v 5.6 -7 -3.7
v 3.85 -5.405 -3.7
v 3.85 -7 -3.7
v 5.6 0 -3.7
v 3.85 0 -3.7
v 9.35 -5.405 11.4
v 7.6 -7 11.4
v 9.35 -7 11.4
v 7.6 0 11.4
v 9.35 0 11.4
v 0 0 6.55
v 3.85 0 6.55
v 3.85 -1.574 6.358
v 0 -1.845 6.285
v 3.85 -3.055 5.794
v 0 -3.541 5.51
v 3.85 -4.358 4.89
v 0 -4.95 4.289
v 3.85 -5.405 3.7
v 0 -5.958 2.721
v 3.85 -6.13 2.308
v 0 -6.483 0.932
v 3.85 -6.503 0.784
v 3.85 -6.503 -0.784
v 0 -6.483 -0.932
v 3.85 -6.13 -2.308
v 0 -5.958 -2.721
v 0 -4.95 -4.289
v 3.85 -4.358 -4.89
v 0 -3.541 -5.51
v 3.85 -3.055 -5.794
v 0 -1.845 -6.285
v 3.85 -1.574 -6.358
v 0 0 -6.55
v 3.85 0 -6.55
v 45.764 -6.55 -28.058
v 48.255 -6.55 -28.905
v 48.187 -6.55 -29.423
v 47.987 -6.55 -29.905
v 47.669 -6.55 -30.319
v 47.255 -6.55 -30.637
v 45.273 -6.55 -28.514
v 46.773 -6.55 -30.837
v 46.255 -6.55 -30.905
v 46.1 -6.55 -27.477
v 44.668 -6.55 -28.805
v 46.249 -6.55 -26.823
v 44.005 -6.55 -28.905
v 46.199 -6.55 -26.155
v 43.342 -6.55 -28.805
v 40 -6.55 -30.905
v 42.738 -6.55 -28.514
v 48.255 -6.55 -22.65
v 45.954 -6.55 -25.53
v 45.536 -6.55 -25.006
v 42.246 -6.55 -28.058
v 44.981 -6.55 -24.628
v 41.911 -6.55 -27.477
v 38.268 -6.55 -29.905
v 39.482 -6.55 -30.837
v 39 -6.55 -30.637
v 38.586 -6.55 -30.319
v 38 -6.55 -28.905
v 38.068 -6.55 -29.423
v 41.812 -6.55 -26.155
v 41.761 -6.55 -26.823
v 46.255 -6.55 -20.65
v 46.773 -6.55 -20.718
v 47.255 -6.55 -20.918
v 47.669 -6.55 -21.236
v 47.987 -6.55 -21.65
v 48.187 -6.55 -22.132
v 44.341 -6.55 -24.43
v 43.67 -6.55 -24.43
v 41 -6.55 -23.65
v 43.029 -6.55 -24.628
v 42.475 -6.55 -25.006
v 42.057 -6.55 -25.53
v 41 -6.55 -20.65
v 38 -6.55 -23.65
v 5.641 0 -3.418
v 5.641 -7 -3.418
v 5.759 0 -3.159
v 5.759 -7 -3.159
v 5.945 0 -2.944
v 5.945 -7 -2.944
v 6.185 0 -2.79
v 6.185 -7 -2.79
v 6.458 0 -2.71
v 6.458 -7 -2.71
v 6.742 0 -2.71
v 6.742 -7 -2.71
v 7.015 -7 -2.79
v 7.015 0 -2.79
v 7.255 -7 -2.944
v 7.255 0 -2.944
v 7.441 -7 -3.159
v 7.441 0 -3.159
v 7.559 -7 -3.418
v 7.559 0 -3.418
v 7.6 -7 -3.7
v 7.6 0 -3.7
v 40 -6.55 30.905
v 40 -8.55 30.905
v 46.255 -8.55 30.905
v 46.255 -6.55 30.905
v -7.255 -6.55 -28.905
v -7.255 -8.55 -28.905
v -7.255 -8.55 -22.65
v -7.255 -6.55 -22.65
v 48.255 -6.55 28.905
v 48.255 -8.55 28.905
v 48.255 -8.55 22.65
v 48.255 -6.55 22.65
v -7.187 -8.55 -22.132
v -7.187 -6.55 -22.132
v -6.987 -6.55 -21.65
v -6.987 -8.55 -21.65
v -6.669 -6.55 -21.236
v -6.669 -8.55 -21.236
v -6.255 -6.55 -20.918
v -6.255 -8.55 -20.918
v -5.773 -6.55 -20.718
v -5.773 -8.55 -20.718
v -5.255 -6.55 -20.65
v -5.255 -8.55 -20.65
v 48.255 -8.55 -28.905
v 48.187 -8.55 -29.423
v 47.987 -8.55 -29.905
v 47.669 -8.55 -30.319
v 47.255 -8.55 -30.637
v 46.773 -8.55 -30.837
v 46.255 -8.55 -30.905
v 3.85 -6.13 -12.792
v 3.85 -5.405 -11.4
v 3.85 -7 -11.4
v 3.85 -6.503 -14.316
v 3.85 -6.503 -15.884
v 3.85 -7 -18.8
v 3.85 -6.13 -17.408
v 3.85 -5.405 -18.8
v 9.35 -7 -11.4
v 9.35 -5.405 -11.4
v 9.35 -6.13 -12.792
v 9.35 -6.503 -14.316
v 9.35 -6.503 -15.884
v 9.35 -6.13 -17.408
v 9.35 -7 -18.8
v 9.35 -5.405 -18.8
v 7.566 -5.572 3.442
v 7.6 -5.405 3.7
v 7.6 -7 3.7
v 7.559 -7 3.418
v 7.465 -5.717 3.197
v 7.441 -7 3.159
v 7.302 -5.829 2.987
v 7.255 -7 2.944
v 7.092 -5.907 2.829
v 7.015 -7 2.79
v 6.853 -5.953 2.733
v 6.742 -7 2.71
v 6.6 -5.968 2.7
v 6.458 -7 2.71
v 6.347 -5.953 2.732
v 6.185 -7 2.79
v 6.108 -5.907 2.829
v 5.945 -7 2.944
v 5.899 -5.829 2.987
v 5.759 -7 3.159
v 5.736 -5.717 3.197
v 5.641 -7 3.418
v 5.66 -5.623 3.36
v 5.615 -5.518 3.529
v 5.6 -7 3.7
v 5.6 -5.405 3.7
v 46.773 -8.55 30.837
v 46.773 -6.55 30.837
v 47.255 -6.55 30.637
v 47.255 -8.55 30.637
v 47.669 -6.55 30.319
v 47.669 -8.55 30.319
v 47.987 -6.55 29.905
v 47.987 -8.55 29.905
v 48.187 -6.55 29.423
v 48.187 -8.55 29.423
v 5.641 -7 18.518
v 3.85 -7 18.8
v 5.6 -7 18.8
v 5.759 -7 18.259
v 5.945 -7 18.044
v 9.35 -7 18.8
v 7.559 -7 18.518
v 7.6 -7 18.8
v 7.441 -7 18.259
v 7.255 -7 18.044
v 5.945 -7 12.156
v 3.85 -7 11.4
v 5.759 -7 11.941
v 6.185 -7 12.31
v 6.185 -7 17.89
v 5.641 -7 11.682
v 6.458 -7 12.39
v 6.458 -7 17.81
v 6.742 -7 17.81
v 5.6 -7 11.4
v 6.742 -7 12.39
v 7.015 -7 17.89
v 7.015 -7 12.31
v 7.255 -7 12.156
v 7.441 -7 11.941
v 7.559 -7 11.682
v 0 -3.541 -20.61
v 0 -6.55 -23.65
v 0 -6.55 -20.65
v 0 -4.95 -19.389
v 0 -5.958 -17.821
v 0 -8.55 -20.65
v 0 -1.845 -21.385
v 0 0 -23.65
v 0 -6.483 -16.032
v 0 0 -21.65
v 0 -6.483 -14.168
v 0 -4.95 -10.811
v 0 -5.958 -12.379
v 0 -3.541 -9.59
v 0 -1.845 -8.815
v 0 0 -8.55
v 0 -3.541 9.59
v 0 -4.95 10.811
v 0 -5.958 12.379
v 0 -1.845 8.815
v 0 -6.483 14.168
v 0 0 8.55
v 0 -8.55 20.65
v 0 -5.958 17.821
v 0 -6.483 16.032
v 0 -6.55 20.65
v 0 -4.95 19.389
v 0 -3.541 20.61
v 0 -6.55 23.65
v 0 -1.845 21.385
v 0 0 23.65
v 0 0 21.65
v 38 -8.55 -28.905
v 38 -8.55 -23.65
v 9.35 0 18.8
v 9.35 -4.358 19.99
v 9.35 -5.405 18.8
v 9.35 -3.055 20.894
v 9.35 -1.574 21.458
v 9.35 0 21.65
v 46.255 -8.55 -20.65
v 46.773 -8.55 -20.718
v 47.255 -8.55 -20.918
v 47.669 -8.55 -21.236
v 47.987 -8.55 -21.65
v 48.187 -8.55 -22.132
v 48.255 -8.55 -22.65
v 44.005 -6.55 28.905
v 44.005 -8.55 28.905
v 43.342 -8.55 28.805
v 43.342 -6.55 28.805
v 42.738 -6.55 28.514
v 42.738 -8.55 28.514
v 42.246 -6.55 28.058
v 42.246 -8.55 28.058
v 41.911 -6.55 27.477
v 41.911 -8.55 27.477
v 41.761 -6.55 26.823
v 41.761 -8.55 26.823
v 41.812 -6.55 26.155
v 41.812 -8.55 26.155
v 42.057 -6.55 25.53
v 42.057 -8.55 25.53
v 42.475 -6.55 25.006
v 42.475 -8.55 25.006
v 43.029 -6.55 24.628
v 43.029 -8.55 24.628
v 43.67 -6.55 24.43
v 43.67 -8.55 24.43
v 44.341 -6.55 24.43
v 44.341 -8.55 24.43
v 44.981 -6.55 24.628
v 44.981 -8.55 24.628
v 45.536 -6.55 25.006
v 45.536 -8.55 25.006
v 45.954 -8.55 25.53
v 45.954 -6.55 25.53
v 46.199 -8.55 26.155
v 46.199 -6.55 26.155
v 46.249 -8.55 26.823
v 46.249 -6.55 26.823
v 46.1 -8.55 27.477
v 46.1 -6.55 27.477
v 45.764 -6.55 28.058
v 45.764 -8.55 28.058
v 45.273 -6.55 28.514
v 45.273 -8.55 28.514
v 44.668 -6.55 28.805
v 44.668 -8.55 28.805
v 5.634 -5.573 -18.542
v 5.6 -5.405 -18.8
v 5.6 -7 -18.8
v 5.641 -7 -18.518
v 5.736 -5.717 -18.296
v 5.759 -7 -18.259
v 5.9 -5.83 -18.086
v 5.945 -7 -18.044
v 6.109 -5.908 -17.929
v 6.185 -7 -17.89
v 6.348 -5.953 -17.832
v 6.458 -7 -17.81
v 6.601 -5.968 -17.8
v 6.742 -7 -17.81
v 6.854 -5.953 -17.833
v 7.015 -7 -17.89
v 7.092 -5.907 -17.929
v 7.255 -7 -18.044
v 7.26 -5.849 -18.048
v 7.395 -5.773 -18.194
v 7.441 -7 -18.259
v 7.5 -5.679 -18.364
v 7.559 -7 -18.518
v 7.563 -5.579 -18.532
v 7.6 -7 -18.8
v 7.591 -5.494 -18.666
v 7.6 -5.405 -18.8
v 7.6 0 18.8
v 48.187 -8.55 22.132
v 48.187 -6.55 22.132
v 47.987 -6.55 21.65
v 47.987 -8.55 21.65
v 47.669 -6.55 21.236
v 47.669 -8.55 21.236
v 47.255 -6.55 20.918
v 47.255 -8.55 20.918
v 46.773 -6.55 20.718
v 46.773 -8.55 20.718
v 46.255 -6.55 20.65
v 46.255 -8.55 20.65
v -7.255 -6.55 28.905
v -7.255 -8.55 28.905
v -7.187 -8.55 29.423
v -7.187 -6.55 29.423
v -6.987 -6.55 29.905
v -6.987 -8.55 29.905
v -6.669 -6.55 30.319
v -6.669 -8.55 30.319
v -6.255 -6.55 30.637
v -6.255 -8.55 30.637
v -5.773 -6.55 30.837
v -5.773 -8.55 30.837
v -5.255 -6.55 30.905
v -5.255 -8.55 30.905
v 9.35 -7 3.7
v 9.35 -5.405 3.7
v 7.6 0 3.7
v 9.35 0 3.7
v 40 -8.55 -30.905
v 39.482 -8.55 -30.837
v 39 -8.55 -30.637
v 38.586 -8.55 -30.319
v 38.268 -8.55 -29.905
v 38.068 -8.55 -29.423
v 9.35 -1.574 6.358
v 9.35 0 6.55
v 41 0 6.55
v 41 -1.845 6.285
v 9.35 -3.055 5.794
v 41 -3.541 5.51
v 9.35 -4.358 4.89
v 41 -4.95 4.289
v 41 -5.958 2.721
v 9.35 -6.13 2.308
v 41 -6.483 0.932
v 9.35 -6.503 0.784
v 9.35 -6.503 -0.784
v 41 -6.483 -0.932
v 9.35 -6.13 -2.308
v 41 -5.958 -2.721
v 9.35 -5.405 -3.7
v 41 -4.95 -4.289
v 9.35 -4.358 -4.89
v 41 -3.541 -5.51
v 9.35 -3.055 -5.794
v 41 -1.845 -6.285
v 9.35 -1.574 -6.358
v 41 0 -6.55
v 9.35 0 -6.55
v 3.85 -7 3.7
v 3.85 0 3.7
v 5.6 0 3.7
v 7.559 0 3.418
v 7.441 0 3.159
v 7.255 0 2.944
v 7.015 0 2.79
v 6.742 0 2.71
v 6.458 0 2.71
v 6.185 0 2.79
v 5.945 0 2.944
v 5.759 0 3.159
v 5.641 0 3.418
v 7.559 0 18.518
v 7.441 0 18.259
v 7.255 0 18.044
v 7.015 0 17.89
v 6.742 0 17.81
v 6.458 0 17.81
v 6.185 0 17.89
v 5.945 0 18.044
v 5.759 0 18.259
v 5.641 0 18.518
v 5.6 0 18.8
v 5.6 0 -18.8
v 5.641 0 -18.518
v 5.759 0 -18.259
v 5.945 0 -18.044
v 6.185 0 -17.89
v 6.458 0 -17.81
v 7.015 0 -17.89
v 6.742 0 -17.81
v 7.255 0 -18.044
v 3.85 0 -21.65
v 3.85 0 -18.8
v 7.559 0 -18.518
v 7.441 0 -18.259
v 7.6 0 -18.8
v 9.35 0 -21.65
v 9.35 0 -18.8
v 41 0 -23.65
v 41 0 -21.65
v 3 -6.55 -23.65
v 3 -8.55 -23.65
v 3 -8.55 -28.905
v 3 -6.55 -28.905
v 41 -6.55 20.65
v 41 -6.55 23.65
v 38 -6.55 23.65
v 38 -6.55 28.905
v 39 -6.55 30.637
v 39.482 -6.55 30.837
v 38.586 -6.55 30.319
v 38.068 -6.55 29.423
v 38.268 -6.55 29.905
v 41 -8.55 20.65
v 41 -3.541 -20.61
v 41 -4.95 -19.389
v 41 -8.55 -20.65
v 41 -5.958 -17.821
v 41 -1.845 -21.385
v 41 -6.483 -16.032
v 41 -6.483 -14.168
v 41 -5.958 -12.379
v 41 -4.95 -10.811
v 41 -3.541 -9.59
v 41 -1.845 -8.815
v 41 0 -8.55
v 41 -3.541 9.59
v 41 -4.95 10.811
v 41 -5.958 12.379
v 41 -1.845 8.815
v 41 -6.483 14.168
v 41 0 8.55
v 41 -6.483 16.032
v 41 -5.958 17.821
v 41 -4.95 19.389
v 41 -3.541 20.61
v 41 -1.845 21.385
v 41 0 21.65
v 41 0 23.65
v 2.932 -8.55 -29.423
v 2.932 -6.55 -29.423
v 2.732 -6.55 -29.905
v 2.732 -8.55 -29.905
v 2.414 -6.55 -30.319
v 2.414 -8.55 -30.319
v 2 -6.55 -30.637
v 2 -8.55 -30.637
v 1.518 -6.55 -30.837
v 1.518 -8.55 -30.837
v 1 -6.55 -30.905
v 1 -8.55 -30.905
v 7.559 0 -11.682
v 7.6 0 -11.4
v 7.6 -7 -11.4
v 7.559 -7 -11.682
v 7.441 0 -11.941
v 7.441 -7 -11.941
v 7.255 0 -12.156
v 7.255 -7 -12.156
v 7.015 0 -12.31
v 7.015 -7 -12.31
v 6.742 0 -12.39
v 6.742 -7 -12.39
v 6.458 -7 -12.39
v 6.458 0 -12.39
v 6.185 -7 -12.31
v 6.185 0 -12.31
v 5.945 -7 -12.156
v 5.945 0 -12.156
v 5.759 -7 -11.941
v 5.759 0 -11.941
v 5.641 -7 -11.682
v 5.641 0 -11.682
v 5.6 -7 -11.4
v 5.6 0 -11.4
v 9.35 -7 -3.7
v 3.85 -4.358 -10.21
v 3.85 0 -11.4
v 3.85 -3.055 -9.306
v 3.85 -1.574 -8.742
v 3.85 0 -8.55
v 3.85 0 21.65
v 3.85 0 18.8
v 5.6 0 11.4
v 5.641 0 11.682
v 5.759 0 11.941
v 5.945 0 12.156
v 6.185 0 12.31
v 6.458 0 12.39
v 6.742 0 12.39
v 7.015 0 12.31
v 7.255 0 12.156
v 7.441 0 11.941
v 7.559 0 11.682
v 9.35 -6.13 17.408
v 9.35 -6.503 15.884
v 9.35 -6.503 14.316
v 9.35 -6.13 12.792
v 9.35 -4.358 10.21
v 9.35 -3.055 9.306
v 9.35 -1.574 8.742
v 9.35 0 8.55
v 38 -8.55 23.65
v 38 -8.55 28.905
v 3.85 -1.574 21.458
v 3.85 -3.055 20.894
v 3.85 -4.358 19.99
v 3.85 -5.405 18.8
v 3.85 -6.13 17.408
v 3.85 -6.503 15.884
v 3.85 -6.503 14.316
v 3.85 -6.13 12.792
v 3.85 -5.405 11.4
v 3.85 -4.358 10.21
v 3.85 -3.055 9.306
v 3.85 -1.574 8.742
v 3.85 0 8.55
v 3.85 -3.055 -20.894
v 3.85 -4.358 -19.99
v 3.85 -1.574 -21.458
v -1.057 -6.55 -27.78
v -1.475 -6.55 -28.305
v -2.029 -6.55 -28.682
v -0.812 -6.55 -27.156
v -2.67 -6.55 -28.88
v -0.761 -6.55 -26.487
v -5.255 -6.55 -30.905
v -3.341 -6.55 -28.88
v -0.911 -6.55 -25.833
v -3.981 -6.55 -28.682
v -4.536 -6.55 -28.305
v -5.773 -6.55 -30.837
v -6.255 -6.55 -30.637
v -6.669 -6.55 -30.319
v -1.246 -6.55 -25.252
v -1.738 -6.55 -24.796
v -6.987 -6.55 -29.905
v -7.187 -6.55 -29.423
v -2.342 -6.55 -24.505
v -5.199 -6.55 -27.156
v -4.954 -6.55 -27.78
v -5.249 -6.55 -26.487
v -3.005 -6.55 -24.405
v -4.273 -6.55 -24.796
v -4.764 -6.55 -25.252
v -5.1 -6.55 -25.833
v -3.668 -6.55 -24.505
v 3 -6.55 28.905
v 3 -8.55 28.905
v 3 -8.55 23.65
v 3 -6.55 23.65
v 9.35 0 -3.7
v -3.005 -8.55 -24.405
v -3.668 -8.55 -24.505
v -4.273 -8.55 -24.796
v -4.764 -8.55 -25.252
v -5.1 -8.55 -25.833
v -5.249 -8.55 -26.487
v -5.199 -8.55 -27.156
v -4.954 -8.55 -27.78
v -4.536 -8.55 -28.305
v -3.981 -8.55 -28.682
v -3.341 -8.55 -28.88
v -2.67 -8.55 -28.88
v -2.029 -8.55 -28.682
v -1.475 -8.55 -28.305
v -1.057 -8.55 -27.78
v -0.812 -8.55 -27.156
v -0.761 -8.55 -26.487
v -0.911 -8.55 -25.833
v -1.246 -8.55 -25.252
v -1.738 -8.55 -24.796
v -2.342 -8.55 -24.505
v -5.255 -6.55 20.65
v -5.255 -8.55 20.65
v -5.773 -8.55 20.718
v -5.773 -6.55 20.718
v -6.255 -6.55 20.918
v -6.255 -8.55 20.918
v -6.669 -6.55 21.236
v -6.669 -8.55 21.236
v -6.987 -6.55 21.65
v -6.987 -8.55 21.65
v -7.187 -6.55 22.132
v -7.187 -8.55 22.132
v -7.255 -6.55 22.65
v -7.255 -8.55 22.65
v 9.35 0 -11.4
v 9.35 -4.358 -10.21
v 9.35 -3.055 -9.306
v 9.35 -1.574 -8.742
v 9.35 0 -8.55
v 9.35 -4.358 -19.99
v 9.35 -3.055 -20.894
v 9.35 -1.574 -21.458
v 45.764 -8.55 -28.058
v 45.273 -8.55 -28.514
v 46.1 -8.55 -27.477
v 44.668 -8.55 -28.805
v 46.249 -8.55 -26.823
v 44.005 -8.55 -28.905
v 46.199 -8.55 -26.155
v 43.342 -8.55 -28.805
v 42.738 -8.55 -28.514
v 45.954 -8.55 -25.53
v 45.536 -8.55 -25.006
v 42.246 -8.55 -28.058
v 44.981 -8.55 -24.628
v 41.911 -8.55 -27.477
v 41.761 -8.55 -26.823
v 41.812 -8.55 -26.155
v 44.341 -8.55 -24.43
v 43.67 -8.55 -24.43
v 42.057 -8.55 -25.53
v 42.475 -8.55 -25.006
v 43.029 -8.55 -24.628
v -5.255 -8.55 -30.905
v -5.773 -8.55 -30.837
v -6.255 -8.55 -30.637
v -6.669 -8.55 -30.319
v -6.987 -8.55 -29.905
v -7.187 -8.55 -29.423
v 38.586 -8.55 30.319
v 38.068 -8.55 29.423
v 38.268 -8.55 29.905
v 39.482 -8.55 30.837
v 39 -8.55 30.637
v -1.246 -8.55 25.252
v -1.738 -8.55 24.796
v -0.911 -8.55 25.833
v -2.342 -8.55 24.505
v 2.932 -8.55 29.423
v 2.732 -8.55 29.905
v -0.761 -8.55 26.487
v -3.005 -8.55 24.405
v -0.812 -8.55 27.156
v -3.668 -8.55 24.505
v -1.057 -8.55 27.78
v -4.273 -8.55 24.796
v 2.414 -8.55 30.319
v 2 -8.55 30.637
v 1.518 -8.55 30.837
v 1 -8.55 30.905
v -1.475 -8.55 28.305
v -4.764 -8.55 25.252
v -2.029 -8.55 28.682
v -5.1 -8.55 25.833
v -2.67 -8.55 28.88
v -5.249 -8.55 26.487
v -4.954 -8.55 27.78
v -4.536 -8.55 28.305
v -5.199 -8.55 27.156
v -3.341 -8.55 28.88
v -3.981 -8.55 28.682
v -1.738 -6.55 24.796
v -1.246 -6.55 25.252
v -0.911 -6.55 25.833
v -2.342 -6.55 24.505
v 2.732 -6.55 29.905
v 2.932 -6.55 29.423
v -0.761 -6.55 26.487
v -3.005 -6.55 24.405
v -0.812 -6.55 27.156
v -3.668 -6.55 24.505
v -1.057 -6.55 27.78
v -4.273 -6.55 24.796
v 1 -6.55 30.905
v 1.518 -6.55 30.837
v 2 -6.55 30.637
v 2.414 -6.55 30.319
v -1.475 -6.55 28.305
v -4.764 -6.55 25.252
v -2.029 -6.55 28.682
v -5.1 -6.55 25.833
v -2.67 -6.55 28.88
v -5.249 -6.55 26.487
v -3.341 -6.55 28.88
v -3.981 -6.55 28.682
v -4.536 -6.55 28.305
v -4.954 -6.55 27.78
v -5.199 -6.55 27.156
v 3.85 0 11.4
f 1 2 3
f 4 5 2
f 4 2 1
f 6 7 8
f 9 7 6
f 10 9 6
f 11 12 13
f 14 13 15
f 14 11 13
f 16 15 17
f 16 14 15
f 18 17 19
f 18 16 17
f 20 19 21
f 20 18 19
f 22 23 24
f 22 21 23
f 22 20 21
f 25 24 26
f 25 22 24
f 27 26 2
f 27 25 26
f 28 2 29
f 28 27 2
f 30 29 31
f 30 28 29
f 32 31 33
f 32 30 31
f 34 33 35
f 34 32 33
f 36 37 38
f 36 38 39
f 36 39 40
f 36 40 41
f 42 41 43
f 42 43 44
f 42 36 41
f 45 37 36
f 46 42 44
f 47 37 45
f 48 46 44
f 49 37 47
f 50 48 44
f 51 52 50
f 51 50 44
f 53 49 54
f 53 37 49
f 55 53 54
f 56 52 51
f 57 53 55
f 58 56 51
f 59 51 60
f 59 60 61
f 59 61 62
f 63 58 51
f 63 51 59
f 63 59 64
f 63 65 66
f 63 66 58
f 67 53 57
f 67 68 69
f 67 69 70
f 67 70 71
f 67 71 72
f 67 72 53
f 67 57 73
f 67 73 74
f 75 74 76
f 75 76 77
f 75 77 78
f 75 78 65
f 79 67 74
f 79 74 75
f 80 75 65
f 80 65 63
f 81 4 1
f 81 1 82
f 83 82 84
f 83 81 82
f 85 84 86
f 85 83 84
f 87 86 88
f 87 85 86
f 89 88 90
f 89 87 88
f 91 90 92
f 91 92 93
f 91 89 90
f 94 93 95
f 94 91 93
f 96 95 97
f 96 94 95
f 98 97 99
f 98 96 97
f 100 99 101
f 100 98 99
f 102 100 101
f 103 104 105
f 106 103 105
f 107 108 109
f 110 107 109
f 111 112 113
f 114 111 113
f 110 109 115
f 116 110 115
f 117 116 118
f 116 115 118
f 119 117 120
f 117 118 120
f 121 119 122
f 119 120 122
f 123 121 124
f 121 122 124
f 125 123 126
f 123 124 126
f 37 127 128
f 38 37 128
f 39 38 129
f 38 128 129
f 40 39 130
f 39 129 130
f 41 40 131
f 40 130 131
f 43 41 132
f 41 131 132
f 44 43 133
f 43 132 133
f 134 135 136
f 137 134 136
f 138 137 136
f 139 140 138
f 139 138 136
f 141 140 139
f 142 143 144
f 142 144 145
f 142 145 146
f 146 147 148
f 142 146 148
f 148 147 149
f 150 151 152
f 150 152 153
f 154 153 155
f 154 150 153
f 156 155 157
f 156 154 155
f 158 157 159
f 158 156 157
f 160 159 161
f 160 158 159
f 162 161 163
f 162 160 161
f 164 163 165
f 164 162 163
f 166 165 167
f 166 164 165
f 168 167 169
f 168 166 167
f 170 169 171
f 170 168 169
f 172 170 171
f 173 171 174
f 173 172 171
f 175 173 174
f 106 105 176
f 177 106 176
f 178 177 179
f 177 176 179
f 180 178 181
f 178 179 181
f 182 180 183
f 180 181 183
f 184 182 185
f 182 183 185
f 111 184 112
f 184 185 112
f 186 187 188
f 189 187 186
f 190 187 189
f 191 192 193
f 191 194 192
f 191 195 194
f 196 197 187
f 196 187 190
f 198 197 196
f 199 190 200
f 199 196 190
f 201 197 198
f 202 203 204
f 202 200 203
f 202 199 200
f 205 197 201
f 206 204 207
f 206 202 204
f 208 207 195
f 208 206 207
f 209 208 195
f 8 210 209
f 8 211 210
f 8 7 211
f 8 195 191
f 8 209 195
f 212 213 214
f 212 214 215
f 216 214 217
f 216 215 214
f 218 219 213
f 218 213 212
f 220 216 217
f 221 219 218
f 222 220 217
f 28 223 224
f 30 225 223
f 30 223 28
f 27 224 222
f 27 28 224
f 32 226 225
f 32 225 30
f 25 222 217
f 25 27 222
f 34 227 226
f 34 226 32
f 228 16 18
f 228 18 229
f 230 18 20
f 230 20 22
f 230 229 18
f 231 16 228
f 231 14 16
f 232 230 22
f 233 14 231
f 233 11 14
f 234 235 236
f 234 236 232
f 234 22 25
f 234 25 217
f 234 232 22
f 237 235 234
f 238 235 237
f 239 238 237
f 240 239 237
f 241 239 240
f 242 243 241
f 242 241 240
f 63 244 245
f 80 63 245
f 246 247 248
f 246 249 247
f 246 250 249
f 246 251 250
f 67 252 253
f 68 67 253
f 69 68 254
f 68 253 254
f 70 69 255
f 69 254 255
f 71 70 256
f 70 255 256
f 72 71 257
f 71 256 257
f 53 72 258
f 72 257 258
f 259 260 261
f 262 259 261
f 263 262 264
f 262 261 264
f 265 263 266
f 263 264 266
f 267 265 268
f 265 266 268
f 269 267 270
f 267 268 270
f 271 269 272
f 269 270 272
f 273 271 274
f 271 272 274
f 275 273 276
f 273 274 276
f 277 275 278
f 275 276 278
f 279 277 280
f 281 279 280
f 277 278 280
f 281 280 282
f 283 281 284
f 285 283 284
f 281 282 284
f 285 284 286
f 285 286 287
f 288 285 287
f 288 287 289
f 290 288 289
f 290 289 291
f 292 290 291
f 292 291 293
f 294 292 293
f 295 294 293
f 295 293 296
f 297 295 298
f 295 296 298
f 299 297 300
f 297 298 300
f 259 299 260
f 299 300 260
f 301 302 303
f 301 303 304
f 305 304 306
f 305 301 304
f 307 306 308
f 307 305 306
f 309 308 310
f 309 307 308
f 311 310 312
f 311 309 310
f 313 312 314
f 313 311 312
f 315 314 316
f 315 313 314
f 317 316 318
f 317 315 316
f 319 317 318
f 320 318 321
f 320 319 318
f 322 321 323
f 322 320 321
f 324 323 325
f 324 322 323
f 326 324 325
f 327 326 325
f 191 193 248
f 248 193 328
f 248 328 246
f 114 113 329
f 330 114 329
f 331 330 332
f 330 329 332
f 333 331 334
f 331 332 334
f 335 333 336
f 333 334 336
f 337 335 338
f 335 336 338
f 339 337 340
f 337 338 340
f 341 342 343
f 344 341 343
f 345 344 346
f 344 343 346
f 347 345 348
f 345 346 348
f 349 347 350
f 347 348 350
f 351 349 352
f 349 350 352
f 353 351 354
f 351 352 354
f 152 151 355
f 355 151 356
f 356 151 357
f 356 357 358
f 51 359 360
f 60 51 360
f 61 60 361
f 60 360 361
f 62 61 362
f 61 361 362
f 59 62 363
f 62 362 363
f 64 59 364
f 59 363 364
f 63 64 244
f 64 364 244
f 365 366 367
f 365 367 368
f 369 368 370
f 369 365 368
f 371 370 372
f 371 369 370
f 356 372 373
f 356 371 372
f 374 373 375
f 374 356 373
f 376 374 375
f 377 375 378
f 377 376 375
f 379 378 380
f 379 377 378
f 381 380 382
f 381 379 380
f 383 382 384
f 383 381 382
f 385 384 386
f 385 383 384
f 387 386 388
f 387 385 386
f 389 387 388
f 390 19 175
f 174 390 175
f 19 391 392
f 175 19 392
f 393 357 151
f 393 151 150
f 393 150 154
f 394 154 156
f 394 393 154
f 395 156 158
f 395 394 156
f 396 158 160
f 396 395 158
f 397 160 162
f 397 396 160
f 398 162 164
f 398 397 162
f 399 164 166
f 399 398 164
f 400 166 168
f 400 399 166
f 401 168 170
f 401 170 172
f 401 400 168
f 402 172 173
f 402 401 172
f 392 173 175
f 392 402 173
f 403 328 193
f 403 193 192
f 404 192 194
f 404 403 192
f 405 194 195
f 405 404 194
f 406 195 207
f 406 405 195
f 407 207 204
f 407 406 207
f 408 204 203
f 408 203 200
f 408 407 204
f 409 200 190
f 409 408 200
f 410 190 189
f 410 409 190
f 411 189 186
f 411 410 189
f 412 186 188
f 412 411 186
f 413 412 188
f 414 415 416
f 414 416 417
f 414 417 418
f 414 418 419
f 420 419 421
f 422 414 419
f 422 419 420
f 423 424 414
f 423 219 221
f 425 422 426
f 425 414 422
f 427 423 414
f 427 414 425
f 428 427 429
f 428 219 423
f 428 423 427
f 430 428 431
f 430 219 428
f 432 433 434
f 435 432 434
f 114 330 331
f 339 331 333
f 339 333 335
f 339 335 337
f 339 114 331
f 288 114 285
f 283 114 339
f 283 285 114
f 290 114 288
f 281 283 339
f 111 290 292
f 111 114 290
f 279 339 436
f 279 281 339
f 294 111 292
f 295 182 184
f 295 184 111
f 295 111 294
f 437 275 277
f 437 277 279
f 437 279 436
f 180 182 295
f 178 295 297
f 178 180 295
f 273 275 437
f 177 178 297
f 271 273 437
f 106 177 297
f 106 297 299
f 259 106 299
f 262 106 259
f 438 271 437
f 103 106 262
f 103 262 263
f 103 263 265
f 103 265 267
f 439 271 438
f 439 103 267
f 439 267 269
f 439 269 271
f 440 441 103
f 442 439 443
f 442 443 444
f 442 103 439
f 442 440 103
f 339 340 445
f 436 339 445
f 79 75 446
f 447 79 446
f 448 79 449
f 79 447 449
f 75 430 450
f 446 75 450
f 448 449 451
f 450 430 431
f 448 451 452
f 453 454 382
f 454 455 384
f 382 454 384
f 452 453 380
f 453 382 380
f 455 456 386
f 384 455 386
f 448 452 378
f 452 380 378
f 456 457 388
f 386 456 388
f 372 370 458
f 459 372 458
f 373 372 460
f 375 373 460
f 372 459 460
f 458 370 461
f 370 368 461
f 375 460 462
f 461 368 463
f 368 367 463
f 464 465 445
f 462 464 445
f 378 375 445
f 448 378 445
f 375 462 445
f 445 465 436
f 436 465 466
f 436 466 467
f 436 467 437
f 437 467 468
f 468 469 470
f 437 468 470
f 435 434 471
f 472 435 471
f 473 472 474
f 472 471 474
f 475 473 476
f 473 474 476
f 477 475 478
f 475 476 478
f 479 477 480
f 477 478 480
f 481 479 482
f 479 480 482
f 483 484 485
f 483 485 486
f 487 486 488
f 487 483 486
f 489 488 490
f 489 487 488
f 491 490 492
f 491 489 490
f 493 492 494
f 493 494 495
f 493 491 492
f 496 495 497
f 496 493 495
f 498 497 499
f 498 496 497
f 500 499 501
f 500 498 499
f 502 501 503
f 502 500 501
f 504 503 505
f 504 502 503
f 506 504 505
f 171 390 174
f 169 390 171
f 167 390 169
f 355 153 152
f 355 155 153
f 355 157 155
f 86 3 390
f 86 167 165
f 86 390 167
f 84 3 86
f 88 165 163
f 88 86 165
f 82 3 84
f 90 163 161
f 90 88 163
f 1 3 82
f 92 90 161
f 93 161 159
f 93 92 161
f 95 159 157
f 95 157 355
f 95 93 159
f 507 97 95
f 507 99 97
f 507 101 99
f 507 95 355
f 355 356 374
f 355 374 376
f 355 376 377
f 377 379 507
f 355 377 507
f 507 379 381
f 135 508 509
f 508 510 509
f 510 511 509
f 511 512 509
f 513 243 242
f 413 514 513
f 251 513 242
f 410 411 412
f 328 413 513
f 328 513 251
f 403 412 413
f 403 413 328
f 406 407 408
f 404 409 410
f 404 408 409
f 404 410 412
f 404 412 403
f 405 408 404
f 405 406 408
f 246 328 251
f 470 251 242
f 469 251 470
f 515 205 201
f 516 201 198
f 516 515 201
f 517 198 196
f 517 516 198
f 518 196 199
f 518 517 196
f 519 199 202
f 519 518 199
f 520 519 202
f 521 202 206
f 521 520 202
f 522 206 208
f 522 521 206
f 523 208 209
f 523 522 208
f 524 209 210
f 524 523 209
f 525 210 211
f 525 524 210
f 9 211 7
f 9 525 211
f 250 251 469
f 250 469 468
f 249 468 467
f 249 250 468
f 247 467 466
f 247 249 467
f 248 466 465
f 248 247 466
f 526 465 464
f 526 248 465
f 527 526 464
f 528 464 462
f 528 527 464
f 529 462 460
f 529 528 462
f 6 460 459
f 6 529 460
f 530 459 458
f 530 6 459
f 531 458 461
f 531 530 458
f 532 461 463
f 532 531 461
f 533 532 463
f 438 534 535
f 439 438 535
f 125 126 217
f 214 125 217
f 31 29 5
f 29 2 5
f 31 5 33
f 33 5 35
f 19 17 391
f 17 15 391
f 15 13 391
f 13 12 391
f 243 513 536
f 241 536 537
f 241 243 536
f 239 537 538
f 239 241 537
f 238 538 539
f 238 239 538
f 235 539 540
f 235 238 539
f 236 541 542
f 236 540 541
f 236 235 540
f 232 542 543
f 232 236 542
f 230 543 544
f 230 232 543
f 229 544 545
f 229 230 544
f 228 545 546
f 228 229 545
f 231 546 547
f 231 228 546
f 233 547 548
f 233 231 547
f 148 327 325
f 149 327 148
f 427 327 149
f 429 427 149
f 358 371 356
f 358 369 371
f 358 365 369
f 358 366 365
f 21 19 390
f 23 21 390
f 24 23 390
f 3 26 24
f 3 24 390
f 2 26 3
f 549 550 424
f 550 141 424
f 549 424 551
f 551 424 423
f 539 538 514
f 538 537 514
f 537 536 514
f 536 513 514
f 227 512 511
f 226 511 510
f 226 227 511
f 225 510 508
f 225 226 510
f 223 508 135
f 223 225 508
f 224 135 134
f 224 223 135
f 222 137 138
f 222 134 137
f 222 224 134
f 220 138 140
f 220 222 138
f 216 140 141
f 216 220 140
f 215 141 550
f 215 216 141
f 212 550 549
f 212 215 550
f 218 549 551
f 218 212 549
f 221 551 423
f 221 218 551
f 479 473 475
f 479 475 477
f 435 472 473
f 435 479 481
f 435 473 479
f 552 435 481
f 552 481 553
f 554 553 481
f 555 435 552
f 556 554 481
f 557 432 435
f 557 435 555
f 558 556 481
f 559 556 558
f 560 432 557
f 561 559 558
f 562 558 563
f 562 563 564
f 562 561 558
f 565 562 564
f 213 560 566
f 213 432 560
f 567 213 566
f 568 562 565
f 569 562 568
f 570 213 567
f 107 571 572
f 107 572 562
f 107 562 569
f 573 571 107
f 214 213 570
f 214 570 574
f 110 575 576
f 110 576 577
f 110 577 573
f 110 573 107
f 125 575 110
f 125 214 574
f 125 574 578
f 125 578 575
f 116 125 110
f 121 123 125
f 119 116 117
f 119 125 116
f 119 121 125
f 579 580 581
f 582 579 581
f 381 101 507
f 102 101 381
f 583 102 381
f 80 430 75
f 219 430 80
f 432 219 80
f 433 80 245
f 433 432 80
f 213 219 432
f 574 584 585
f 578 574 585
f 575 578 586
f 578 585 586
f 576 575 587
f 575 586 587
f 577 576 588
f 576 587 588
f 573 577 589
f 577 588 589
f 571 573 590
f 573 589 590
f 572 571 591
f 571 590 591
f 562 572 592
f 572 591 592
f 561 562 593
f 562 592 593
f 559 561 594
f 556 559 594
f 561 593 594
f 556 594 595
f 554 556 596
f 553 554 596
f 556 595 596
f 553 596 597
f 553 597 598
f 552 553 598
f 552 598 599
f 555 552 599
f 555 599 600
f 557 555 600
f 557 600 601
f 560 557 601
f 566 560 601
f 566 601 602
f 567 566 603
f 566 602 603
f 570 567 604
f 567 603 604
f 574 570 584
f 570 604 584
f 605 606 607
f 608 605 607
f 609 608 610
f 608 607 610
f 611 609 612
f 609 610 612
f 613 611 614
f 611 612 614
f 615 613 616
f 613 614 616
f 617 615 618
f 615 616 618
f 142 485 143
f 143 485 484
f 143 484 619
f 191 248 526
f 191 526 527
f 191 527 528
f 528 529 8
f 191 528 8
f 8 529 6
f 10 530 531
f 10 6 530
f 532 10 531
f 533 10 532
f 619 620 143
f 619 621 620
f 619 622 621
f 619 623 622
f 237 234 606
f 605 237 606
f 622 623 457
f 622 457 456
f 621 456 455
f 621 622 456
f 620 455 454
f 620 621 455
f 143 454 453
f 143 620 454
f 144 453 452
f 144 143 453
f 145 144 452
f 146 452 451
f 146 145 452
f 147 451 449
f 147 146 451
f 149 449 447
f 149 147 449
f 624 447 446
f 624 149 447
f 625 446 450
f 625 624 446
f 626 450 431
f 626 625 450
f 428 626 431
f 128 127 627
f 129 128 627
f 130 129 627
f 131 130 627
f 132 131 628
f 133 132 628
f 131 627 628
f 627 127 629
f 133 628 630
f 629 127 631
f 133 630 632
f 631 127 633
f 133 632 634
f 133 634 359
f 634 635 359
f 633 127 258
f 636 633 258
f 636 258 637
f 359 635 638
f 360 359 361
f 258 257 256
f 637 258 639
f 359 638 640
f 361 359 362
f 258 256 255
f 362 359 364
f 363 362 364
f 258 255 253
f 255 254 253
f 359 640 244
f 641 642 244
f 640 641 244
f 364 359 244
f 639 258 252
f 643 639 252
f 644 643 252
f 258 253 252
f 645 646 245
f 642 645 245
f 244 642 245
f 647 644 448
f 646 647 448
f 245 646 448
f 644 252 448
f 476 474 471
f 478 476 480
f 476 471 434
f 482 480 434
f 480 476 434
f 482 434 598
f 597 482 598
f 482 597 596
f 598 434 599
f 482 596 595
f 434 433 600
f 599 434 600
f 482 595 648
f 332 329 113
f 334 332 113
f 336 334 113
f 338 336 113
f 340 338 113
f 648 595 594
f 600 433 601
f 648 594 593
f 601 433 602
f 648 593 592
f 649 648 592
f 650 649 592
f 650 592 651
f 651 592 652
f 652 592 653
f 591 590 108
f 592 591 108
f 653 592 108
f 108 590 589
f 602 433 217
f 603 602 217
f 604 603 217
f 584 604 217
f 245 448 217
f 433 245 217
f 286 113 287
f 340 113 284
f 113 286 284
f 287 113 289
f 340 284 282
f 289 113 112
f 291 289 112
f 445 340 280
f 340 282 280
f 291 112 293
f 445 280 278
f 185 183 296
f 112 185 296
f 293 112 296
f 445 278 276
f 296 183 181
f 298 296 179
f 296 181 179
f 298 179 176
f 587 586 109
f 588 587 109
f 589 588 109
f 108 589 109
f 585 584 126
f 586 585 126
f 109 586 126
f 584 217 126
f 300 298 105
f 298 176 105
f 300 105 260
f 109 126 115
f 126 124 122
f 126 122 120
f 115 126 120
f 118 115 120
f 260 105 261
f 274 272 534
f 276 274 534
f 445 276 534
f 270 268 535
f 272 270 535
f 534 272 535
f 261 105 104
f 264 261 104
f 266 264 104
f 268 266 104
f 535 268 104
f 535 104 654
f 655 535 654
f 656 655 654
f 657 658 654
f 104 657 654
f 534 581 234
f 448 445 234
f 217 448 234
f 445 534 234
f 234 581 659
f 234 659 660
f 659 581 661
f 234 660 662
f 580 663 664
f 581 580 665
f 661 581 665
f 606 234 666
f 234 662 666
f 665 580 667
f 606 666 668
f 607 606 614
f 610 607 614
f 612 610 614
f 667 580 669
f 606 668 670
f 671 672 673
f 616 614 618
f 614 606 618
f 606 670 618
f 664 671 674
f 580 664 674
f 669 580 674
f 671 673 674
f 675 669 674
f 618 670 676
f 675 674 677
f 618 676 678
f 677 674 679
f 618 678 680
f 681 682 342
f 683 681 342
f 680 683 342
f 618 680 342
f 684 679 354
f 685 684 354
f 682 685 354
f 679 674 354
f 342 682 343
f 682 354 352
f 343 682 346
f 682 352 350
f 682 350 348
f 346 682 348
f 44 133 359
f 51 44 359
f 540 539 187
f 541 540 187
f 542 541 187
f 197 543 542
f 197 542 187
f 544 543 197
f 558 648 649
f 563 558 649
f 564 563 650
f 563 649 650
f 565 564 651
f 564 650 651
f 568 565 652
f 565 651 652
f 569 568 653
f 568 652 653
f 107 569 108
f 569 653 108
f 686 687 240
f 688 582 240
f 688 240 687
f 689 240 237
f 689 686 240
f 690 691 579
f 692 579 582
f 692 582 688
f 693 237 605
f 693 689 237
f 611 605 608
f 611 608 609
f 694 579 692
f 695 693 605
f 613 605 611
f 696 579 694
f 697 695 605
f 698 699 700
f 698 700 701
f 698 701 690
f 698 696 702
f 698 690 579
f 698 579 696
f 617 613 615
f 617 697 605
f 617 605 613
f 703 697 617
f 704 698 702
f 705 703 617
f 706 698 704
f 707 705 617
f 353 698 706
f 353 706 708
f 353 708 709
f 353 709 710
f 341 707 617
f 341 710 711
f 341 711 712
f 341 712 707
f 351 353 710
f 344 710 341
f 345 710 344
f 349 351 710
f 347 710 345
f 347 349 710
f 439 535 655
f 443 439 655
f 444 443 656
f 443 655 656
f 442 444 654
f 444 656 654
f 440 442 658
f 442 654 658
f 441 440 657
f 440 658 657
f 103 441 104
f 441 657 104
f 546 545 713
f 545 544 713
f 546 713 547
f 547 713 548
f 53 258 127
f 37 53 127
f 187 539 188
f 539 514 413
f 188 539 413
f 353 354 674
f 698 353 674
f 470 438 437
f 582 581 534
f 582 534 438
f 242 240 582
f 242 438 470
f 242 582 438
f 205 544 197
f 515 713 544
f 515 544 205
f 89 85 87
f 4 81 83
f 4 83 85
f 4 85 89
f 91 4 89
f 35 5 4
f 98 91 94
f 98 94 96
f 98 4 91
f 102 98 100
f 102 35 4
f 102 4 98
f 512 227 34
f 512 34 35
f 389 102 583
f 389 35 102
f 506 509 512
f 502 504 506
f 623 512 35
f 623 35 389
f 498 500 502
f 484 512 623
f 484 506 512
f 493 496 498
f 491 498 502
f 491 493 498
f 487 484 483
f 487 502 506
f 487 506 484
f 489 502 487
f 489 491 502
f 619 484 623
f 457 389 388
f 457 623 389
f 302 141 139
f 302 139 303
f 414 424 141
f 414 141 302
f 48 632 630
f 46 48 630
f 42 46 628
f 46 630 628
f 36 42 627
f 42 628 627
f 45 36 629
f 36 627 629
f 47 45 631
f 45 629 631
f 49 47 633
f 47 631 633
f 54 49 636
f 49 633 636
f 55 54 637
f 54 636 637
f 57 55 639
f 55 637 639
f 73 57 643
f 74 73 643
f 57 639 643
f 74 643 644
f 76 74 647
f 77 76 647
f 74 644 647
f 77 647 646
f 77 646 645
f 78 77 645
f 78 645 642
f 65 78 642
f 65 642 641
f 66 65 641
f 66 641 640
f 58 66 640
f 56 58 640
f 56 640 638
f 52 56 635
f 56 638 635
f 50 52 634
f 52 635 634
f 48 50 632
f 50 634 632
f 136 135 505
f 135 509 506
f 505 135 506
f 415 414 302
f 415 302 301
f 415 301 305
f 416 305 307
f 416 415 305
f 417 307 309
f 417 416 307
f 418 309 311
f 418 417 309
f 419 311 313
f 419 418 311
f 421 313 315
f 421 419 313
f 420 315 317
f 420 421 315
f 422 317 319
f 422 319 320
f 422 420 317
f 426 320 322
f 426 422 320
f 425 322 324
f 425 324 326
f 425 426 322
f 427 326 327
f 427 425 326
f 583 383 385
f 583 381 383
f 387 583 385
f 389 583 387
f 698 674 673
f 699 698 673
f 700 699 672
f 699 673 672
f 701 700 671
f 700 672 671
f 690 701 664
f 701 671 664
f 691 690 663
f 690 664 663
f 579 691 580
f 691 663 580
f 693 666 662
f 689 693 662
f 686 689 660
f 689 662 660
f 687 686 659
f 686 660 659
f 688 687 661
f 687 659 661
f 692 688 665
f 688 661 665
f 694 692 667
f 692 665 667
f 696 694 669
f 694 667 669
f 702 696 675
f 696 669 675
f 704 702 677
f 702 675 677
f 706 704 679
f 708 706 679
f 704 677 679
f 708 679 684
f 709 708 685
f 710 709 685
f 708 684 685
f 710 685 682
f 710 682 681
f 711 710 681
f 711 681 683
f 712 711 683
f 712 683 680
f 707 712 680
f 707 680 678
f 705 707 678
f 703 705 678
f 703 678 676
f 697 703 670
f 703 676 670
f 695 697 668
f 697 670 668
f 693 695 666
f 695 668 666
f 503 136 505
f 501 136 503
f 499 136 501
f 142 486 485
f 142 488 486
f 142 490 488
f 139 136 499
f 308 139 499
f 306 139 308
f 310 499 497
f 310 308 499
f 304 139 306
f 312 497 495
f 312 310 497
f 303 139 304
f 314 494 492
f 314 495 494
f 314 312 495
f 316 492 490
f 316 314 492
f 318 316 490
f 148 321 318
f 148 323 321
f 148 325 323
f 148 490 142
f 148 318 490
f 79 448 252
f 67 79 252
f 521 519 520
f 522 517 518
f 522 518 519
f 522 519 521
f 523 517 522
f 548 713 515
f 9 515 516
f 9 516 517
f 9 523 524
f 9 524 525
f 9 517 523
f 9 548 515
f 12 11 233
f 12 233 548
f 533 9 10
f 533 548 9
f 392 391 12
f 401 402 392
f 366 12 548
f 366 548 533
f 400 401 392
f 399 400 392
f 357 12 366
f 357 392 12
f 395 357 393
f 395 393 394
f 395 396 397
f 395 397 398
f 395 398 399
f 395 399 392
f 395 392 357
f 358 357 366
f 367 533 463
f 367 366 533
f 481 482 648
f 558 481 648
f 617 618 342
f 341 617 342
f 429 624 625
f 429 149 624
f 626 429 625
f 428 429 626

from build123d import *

# Parameters (mm, degrees)
BOSS_EXTRUDE1_DEPTH = 41
BOSS_EXTRUDE2_REACH = 50.098
SKETCH2_R           = 1
SKETCH4_W           = 5.5
SKETCH4_H           = 13.1
SKETCH4_R           = 1
CUT_EXTRUDE1_DEPTH  = 7
SKETCH5_R           = 2.25
BOSS_EXTRUDE3_DEPTH = 2
BOSS_EXTRUDE4_REACH = 59.938
SKETCH6_W           = 5.5
SKETCH6_H           = 2.85


with BuildPart() as part:
    # Sketch1 → Boss-Extrude1 (new body)
    with BuildSketch(Plane(origin=(0, 0, 0), x_dir=(0, 0, -1), z_dir=(1, 0, 0))):
        with BuildLine():
            Line((-8.55, 0), (-6.55, 0))
            ThreePointArc((-6.55, 0), (0, -6.55), (6.55, 0))
            Line((6.55, 0), (8.55, 0))
            ThreePointArc((8.55, 0), (15.1, -6.55), (21.65, 0))
            Line((21.65, 0), (23.65, 0))
            Line((23.65, 0), (23.65, -8.55))
            Line((23.65, -8.55), (-23.65, -8.55))
            Line((-23.65, -8.55), (-23.65, 0))
            Line((-23.65, 0), (-21.65, 0))
            ThreePointArc((-21.65, 0), (-15.1, -6.55), (-8.55, 0))
        make_face()
    extrude(amount=BOSS_EXTRUDE1_DEPTH)

    # Sketch2 → Boss-Extrude2 (add, up to next)
    with BuildSketch(Plane(origin=(0, 0, 0), x_dir=(1, 0, 0), z_dir=(0, 1, 0)), mode=Mode.PRIVATE) as boss_extrude2_sk1:
        with Locations(Location((6.6, 3.7, 0), (0, 0, 270))):
            Circle(SKETCH2_R)
    boss_extrude2_tool1 = extrude(boss_extrude2_sk1.sketch, amount=-BOSS_EXTRUDE2_REACH, mode=Mode.PRIVATE) - part.part
    # Sketch2 → Boss-Extrude2 (add, up to next)
    with BuildSketch(Plane(origin=(0, 0, 0), x_dir=(1, 0, 0), z_dir=(0, 1, 0)), mode=Mode.PRIVATE) as boss_extrude2_sk2:
        with Locations(Location((6.6, -3.7, 0), (0, 0, 270))):
            Circle(SKETCH2_R)
    boss_extrude2_tool2 = extrude(boss_extrude2_sk2.sketch, amount=-BOSS_EXTRUDE2_REACH, mode=Mode.PRIVATE) - part.part
    # Sketch2 → Boss-Extrude2 (add, up to next)
    with BuildSketch(Plane(origin=(0, 0, 0), x_dir=(1, 0, 0), z_dir=(0, 1, 0)), mode=Mode.PRIVATE) as boss_extrude2_sk3:
        with Locations(Location((6.6, -11.4, 0), (0, 0, 270))):
            Circle(SKETCH2_R)
    boss_extrude2_tool3 = extrude(boss_extrude2_sk3.sketch, amount=-BOSS_EXTRUDE2_REACH, mode=Mode.PRIVATE) - part.part
    # Sketch2 → Boss-Extrude2 (add, up to next)
    with BuildSketch(Plane(origin=(0, 0, 0), x_dir=(1, 0, 0), z_dir=(0, 1, 0)), mode=Mode.PRIVATE) as boss_extrude2_sk4:
        with Locations(Location((6.6, -18.8, 0), (0, 0, 270))):
            Circle(SKETCH2_R)
    boss_extrude2_tool4 = extrude(boss_extrude2_sk4.sketch, amount=-BOSS_EXTRUDE2_REACH, mode=Mode.PRIVATE) - part.part
    # Sketch2 → Boss-Extrude2 (add, up to next)
    with BuildSketch(Plane(origin=(0, 0, 0), x_dir=(1, 0, 0), z_dir=(0, 1, 0)), mode=Mode.PRIVATE) as boss_extrude2_sk5:
        with Locations(Location((6.6, 18.8, 0), (0, 0, 270))):
            Circle(SKETCH2_R)
    boss_extrude2_tool5 = extrude(boss_extrude2_sk5.sketch, amount=-BOSS_EXTRUDE2_REACH, mode=Mode.PRIVATE) - part.part
    # Sketch2 → Boss-Extrude2 (add, up to next)
    with BuildSketch(Plane(origin=(0, 0, 0), x_dir=(1, 0, 0), z_dir=(0, 1, 0)), mode=Mode.PRIVATE) as boss_extrude2_sk6:
        with Locations(Location((6.6, 11.4, 0), (0, 0, 270))):
            Circle(SKETCH2_R)
    boss_extrude2_tool6 = extrude(boss_extrude2_sk6.sketch, amount=-BOSS_EXTRUDE2_REACH, mode=Mode.PRIVATE) - part.part
    add(boss_extrude2_tool1.solids().sort_by_distance((6.6, 0, -3.7))[0])
    add(boss_extrude2_tool2.solids().sort_by_distance((6.6, 0, 3.7))[0])
    add(boss_extrude2_tool3.solids().sort_by_distance((6.6, 0, 11.4))[0])
    add(boss_extrude2_tool4.solids().sort_by_distance((6.6, 0, 18.8))[0])
    add(boss_extrude2_tool5.solids().sort_by_distance((6.6, 0, -18.8))[0])
    add(boss_extrude2_tool6.solids().sort_by_distance((6.6, 0, -11.4))[0])

    # Sketch4 → Cut-Extrude1 (cut)
    # profile 1 of 3: a face of its own
    with BuildSketch(Plane(origin=(0, 0, 0), x_dir=(1, 0, 0), z_dir=(0, 1, 0))):
        with Locations((6.6, 0)):
            Rectangle(SKETCH4_W, SKETCH4_H)
        with Locations(Location((6.6, 3.7, 0), (0, 0, 270))):
            Circle(SKETCH4_R, mode=Mode.SUBTRACT)
        with Locations(Location((6.6, -3.7, 0), (0, 0, 270))):
            Circle(SKETCH4_R, mode=Mode.SUBTRACT)
    # profile 2 of 3: a face of its own
    with BuildSketch(Plane(origin=(0, 0, 0), x_dir=(1, 0, 0), z_dir=(0, 1, 0))):
        with Locations((6.6, -15.1)):
            Rectangle(SKETCH4_W, SKETCH4_H)
        with Locations(Location((6.6, -11.4, 0), (0, 0, 90))):
            Circle(SKETCH4_R, mode=Mode.SUBTRACT)
        with Locations(Location((6.6, -18.8, 0), (0, 0, 90))):
            Circle(SKETCH4_R, mode=Mode.SUBTRACT)
    # profile 3 of 3: a face of its own
    with BuildSketch(Plane(origin=(0, 0, 0), x_dir=(1, 0, 0), z_dir=(0, 1, 0))):
        with Locations((6.6, 15.1)):
            Rectangle(SKETCH4_W, SKETCH4_H)
        with Locations(Location((6.6, 11.4, 0), (0, 0, 90))):
            Circle(SKETCH4_R, mode=Mode.SUBTRACT)
        with Locations(Location((6.6, 18.8, 0), (0, 0, 90))):
            Circle(SKETCH4_R, mode=Mode.SUBTRACT)
    extrude(amount=-CUT_EXTRUDE1_DEPTH, mode=Mode.SUBTRACT)

    # Sketch5 → Boss-Extrude3 (add)
    # profile 1 of 4: a face of its own
    with BuildSketch(Plane.XZ.offset(8.55)):
        with BuildLine():
            Line((0, 23.65), (0, 20.65))
            Line((0, 20.65), (-5.25520382, 20.65))
            ThreePointArc((-5.25520382, 20.65), (-6.669417382, 21.235786438), (-7.25520382, 22.65))
            Line((-7.25520382, 22.65), (-7.25520382, 28.90520382))
            ThreePointArc((-7.25520382, 28.90520382), (-6.669417382, 30.319417382), (-5.25520382, 30.90520382))
            Line((-5.25520382, 30.90520382), (1, 30.90520382))
            ThreePointArc((1, 30.90520382), (2.414213562, 30.319417382), (3, 28.90520382))
            Line((3, 28.90520382), (3, 23.65))
            Line((3, 23.65), (0, 23.65))
        make_face()
        with Locations(Location((-3.00520382, 26.65520382, 0), (0, 0, 270))):
            Circle(SKETCH5_R, mode=Mode.SUBTRACT)
    # profile 2 of 4: a face of its own
    with BuildSketch(Plane.XZ.offset(8.55)):
        with BuildLine():
            Line((0, -23.65), (3, -23.65))
            Line((3, -23.65), (3, -28.90520382))
            ThreePointArc((3, -28.90520382), (2.414213562, -30.319417382), (1, -30.90520382))
            Line((1, -30.90520382), (-5.25520382, -30.90520382))
            ThreePointArc((-5.25520382, -30.90520382), (-6.669417382, -30.319417382), (-7.25520382, -28.90520382))
            Line((-7.25520382, -28.90520382), (-7.25520382, -22.65))
            ThreePointArc((-7.25520382, -22.65), (-6.669417382, -21.235786438), (-5.25520382, -20.65))
            Line((-5.25520382, -20.65), (0, -20.65))
            Line((0, -20.65), (0, -23.65))
        make_face()
        with Locations(Location((-3.00520382, -26.65520382, 0), (0, 0, 90))):
            Circle(SKETCH5_R, mode=Mode.SUBTRACT)
    # profile 3 of 4: a face of its own
    with BuildSketch(Plane.XZ.offset(8.55)):
        with BuildLine():
            Line((41, -23.65), (41, -20.65))
            Line((41, -20.65), (46.25520382, -20.65))
            ThreePointArc((46.25520382, -20.65), (47.669417382, -21.235786438), (48.25520382, -22.65))
            Line((48.25520382, -22.65), (48.25520382, -28.90520382))
            ThreePointArc((48.25520382, -28.90520382), (47.669417382, -30.319417382), (46.25520382, -30.90520382))
            Line((46.25520382, -30.90520382), (40, -30.90520382))
            ThreePointArc((40, -30.90520382), (38.585786438, -30.319417382), (38, -28.90520382))
            Line((38, -28.90520382), (38, -23.65))
            Line((38, -23.65), (41, -23.65))
        make_face()
        with Locations(Location((44.00520382, -26.65520382, 0), (0, 0, 270))):
            Circle(SKETCH5_R, mode=Mode.SUBTRACT)
    # profile 4 of 4: a face of its own
    with BuildSketch(Plane.XZ.offset(8.55)):
        with BuildLine():
            Line((41, 23.65), (38, 23.65))
            Line((38, 23.65), (38, 28.90520382))
            ThreePointArc((38, 28.90520382), (38.585786438, 30.319417382), (40, 30.90520382))
            Line((40, 30.90520382), (46.25520382, 30.90520382))
            ThreePointArc((46.25520382, 30.90520382), (47.669417382, 30.319417382), (48.25520382, 28.90520382))
            Line((48.25520382, 28.90520382), (48.25520382, 22.65))
            ThreePointArc((48.25520382, 22.65), (47.669417382, 21.235786438), (46.25520382, 20.65))
            Line((46.25520382, 20.65), (41, 20.65))
            Line((41, 20.65), (41, 23.65))
        make_face()
        with Locations(Location((44.00520382, 26.65520382, 0), (0, 0, 90))):
            Circle(SKETCH5_R, mode=Mode.SUBTRACT)
    extrude(amount=-BOSS_EXTRUDE3_DEPTH)

    # Boss-Extrude4: up to this face of the body (flat: up to its plane)
    boss_extrude4_end = Plane(part.part.faces().sort_by_distance((6.6, -7, -15.1))[0])
    # Sketch6 → Boss-Extrude4 (add, up to the picked face)
    with BuildSketch(Plane(origin=(0, 0, 0), x_dir=(1, 0, 0), z_dir=(0, 1, 0)), mode=Mode.PRIVATE) as boss_extrude4_sk1:
        with Locations((6.6, -5.125)):
            Rectangle(SKETCH6_W, SKETCH6_H)
    boss_extrude4_tool1 = split(extrude(boss_extrude4_sk1.sketch, amount=-BOSS_EXTRUDE4_REACH, mode=Mode.PRIVATE), bisect_by=boss_extrude4_end, keep=Keep.BOTH, mode=Mode.PRIVATE)
    # Sketch6 → Boss-Extrude4 (add, up to the picked face)
    with BuildSketch(Plane(origin=(0, 0, 0), x_dir=(1, 0, 0), z_dir=(0, 1, 0)), mode=Mode.PRIVATE) as boss_extrude4_sk2:
        with Locations((6.6, 5.125)):
            Rectangle(SKETCH6_W, SKETCH6_H)
    boss_extrude4_tool2 = split(extrude(boss_extrude4_sk2.sketch, amount=-BOSS_EXTRUDE4_REACH, mode=Mode.PRIVATE), bisect_by=boss_extrude4_end, keep=Keep.BOTH, mode=Mode.PRIVATE)
    # Sketch6 → Boss-Extrude4 (add, up to the picked face)
    with BuildSketch(Plane(origin=(0, 0, 0), x_dir=(1, 0, 0), z_dir=(0, 1, 0)), mode=Mode.PRIVATE) as boss_extrude4_sk3:
        with Locations((6.6, -20.225)):
            Rectangle(SKETCH6_W, SKETCH6_H)
    boss_extrude4_tool3 = split(extrude(boss_extrude4_sk3.sketch, amount=-BOSS_EXTRUDE4_REACH, mode=Mode.PRIVATE), bisect_by=boss_extrude4_end, keep=Keep.BOTH, mode=Mode.PRIVATE)
    # Sketch6 → Boss-Extrude4 (add, up to the picked face)
    with BuildSketch(Plane(origin=(0, 0, 0), x_dir=(1, 0, 0), z_dir=(0, 1, 0)), mode=Mode.PRIVATE) as boss_extrude4_sk4:
        with Locations((6.6, -9.975)):
            Rectangle(SKETCH6_W, SKETCH6_H)
    boss_extrude4_tool4 = split(extrude(boss_extrude4_sk4.sketch, amount=-BOSS_EXTRUDE4_REACH, mode=Mode.PRIVATE), bisect_by=boss_extrude4_end, keep=Keep.BOTH, mode=Mode.PRIVATE)
    # Sketch6 → Boss-Extrude4 (add, up to the picked face)
    with BuildSketch(Plane(origin=(0, 0, 0), x_dir=(1, 0, 0), z_dir=(0, 1, 0)), mode=Mode.PRIVATE) as boss_extrude4_sk5:
        with Locations((6.6, 9.975)):
            Rectangle(SKETCH6_W, SKETCH6_H)
    boss_extrude4_tool5 = split(extrude(boss_extrude4_sk5.sketch, amount=-BOSS_EXTRUDE4_REACH, mode=Mode.PRIVATE), bisect_by=boss_extrude4_end, keep=Keep.BOTH, mode=Mode.PRIVATE)
    # Sketch6 → Boss-Extrude4 (add, up to the picked face)
    with BuildSketch(Plane(origin=(0, 0, 0), x_dir=(1, 0, 0), z_dir=(0, 1, 0)), mode=Mode.PRIVATE) as boss_extrude4_sk6:
        with Locations((6.6, 20.225)):
            Rectangle(SKETCH6_W, SKETCH6_H)
    boss_extrude4_tool6 = split(extrude(boss_extrude4_sk6.sketch, amount=-BOSS_EXTRUDE4_REACH, mode=Mode.PRIVATE), bisect_by=boss_extrude4_end, keep=Keep.BOTH, mode=Mode.PRIVATE)
    add(boss_extrude4_tool1.solids().sort_by(Axis((6.6, 0, 5.125), (0, -1, 0)))[0])
    add(boss_extrude4_tool2.solids().sort_by(Axis((6.6, 0, -5.125), (0, -1, 0)))[0])
    add(boss_extrude4_tool3.solids().sort_by(Axis((6.6, 0, 20.225), (0, -1, 0)))[0])
    add(boss_extrude4_tool4.solids().sort_by(Axis((6.6, 0, 9.975), (0, -1, 0)))[0])
    add(boss_extrude4_tool5.solids().sort_by(Axis((6.6, 0, -9.975), (0, -1, 0)))[0])
    add(boss_extrude4_tool6.solids().sort_by(Axis((6.6, 0, -20.225), (0, -1, 0)))[0])


solid = part.part
